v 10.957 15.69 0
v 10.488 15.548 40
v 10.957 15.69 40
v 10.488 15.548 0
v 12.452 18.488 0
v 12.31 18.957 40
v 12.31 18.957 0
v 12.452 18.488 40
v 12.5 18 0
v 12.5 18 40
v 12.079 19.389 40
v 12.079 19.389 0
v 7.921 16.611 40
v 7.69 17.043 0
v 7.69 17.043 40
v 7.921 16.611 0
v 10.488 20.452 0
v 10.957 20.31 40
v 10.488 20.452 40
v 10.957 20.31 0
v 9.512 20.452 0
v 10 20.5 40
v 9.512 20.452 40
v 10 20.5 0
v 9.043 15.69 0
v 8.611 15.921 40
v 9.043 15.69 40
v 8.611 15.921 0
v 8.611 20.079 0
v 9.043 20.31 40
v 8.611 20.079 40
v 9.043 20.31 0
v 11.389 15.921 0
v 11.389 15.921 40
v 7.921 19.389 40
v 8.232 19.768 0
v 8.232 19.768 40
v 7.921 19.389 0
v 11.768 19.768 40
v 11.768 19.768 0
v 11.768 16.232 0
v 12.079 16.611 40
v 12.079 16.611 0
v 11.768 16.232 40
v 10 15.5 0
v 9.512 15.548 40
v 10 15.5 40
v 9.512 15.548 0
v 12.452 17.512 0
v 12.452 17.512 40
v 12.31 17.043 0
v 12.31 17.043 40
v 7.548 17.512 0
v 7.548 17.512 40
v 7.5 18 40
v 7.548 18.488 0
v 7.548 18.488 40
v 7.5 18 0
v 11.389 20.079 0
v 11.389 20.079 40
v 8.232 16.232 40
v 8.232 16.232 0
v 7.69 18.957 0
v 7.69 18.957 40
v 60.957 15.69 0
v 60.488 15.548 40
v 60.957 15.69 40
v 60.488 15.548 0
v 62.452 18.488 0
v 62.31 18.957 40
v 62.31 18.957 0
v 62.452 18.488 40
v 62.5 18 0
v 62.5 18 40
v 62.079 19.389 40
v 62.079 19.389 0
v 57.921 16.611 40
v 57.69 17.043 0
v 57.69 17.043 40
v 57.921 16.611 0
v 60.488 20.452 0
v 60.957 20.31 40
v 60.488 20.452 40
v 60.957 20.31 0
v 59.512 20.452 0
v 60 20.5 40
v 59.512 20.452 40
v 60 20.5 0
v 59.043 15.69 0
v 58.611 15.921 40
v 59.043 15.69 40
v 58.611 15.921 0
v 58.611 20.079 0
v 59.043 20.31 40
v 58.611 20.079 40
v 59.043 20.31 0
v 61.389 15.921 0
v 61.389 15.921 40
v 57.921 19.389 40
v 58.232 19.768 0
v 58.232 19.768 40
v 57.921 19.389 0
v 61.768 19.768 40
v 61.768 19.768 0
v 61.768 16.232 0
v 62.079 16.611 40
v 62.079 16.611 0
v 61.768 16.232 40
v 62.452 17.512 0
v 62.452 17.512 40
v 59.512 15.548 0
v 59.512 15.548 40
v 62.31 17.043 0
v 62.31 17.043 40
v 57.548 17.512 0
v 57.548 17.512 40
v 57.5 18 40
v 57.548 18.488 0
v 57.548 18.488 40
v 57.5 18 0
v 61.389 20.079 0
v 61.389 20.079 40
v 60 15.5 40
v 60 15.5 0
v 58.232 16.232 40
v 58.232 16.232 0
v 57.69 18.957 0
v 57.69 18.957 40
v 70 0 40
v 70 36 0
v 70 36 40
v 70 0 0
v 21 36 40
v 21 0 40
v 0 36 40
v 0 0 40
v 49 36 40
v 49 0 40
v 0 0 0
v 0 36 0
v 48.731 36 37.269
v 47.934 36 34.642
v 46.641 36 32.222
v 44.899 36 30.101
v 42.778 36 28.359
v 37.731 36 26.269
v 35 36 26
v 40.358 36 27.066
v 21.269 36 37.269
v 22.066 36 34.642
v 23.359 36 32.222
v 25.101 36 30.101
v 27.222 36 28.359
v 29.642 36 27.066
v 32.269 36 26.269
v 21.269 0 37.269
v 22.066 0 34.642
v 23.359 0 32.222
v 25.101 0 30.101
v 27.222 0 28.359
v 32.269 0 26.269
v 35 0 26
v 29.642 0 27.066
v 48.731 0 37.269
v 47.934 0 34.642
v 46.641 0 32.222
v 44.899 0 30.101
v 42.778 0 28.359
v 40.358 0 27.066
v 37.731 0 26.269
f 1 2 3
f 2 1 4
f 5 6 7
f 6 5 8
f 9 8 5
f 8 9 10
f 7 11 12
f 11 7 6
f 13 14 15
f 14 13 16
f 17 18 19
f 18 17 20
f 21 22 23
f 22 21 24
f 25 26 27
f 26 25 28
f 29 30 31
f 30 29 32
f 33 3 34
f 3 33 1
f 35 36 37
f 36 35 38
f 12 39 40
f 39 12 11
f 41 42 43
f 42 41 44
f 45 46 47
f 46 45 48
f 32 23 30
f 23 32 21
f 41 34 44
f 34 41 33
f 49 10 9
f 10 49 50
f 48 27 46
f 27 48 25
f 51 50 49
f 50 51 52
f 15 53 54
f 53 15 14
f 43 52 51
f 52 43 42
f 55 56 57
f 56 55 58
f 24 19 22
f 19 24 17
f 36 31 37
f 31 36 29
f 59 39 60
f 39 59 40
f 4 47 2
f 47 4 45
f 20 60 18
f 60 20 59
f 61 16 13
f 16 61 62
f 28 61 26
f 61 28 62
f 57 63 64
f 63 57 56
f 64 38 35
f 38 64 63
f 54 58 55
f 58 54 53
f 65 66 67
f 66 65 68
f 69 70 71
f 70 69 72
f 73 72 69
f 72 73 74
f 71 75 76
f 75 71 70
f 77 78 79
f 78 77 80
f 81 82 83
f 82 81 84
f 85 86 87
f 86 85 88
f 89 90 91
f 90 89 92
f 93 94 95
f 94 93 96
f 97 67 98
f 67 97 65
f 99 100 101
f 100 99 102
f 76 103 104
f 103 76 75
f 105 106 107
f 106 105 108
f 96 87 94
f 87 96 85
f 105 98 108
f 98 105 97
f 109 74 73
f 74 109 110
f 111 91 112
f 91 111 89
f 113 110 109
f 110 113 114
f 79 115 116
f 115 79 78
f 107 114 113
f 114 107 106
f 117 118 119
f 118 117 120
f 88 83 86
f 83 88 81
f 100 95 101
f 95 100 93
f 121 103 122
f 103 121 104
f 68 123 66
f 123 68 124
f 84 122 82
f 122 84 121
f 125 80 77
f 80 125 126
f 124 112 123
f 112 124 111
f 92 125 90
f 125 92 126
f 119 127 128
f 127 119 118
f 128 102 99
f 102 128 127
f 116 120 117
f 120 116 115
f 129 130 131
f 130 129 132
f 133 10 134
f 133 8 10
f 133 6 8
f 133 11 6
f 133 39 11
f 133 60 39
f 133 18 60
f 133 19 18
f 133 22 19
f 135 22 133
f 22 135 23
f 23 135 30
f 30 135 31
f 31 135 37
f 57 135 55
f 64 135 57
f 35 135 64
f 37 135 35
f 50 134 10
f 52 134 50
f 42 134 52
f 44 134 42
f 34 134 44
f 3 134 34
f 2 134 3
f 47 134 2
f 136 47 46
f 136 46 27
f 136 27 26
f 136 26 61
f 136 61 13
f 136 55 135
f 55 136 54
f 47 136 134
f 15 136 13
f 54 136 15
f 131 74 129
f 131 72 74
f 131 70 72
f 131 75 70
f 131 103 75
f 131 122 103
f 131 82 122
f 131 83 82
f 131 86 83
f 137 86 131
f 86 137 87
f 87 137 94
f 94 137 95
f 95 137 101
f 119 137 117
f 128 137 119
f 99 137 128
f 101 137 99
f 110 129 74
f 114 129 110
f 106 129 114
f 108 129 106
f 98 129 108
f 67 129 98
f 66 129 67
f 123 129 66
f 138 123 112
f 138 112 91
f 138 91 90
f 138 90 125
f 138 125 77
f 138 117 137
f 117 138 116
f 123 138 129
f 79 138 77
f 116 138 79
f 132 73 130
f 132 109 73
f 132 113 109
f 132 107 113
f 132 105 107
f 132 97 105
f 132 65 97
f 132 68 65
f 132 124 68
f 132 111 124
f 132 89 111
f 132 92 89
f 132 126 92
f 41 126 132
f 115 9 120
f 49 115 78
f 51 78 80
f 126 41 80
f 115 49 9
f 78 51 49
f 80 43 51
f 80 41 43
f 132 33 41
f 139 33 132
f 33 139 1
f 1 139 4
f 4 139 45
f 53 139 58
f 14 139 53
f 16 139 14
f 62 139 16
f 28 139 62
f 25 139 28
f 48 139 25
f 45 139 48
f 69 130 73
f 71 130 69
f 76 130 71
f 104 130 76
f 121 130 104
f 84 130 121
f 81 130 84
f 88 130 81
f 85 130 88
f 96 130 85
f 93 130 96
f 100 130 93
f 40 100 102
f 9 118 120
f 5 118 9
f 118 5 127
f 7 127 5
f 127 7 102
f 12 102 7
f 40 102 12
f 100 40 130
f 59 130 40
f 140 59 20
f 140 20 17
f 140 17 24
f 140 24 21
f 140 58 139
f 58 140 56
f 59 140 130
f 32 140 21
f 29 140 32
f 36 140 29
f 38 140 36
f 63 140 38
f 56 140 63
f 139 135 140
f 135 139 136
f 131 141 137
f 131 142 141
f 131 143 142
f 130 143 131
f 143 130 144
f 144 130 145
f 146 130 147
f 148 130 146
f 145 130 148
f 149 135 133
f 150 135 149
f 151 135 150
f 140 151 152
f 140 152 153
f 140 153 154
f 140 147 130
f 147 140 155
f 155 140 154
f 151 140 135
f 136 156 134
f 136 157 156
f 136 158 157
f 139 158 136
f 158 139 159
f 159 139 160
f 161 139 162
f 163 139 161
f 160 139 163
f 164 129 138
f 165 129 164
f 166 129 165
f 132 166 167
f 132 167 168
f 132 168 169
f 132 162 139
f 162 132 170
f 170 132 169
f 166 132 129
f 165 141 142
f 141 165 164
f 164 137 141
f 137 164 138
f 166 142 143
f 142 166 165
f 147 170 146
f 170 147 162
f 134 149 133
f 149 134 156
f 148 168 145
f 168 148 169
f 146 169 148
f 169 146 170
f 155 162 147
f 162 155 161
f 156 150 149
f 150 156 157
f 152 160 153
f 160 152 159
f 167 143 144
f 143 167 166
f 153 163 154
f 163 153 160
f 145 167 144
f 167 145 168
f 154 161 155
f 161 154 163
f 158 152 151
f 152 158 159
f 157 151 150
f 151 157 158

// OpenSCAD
$fn = 32;

// ----------------------------------------------------------------------
// Saddle clamp: plain shaft clamp
// ----------------------------------------------------------------------

// --- parameters (mm) ---
blk_l = 70;               // block length, X
blk_w = 36;               // block width, Y
blk_h = 40;               // block height
clamp_r = 14;             // shaft groove radius
hole_r = 2.5;             // bolt hole radius
hole_m = 10;              // bolt hole margin from the ends
fit_tol = 0.05;           // tolerance for press fits, mm
free_tol = 0.2;           // tolerance for clearance fits, mm

saw_depth = clamp_r + 3;  // saw kerf depth

difference() {
  cube([blk_l, blk_w, blk_h]);
  translate([blk_l / 2, -1, blk_h])
    rotate([-90, 0, 0])
      cylinder(h = blk_w + 2, r = clamp_r);
  for (sx = [0, 1])
    translate([sx ? blk_l - hole_m : hole_m, blk_w / 2, -1])
      cylinder(r = hole_r, h = blk_h + 2);
}
